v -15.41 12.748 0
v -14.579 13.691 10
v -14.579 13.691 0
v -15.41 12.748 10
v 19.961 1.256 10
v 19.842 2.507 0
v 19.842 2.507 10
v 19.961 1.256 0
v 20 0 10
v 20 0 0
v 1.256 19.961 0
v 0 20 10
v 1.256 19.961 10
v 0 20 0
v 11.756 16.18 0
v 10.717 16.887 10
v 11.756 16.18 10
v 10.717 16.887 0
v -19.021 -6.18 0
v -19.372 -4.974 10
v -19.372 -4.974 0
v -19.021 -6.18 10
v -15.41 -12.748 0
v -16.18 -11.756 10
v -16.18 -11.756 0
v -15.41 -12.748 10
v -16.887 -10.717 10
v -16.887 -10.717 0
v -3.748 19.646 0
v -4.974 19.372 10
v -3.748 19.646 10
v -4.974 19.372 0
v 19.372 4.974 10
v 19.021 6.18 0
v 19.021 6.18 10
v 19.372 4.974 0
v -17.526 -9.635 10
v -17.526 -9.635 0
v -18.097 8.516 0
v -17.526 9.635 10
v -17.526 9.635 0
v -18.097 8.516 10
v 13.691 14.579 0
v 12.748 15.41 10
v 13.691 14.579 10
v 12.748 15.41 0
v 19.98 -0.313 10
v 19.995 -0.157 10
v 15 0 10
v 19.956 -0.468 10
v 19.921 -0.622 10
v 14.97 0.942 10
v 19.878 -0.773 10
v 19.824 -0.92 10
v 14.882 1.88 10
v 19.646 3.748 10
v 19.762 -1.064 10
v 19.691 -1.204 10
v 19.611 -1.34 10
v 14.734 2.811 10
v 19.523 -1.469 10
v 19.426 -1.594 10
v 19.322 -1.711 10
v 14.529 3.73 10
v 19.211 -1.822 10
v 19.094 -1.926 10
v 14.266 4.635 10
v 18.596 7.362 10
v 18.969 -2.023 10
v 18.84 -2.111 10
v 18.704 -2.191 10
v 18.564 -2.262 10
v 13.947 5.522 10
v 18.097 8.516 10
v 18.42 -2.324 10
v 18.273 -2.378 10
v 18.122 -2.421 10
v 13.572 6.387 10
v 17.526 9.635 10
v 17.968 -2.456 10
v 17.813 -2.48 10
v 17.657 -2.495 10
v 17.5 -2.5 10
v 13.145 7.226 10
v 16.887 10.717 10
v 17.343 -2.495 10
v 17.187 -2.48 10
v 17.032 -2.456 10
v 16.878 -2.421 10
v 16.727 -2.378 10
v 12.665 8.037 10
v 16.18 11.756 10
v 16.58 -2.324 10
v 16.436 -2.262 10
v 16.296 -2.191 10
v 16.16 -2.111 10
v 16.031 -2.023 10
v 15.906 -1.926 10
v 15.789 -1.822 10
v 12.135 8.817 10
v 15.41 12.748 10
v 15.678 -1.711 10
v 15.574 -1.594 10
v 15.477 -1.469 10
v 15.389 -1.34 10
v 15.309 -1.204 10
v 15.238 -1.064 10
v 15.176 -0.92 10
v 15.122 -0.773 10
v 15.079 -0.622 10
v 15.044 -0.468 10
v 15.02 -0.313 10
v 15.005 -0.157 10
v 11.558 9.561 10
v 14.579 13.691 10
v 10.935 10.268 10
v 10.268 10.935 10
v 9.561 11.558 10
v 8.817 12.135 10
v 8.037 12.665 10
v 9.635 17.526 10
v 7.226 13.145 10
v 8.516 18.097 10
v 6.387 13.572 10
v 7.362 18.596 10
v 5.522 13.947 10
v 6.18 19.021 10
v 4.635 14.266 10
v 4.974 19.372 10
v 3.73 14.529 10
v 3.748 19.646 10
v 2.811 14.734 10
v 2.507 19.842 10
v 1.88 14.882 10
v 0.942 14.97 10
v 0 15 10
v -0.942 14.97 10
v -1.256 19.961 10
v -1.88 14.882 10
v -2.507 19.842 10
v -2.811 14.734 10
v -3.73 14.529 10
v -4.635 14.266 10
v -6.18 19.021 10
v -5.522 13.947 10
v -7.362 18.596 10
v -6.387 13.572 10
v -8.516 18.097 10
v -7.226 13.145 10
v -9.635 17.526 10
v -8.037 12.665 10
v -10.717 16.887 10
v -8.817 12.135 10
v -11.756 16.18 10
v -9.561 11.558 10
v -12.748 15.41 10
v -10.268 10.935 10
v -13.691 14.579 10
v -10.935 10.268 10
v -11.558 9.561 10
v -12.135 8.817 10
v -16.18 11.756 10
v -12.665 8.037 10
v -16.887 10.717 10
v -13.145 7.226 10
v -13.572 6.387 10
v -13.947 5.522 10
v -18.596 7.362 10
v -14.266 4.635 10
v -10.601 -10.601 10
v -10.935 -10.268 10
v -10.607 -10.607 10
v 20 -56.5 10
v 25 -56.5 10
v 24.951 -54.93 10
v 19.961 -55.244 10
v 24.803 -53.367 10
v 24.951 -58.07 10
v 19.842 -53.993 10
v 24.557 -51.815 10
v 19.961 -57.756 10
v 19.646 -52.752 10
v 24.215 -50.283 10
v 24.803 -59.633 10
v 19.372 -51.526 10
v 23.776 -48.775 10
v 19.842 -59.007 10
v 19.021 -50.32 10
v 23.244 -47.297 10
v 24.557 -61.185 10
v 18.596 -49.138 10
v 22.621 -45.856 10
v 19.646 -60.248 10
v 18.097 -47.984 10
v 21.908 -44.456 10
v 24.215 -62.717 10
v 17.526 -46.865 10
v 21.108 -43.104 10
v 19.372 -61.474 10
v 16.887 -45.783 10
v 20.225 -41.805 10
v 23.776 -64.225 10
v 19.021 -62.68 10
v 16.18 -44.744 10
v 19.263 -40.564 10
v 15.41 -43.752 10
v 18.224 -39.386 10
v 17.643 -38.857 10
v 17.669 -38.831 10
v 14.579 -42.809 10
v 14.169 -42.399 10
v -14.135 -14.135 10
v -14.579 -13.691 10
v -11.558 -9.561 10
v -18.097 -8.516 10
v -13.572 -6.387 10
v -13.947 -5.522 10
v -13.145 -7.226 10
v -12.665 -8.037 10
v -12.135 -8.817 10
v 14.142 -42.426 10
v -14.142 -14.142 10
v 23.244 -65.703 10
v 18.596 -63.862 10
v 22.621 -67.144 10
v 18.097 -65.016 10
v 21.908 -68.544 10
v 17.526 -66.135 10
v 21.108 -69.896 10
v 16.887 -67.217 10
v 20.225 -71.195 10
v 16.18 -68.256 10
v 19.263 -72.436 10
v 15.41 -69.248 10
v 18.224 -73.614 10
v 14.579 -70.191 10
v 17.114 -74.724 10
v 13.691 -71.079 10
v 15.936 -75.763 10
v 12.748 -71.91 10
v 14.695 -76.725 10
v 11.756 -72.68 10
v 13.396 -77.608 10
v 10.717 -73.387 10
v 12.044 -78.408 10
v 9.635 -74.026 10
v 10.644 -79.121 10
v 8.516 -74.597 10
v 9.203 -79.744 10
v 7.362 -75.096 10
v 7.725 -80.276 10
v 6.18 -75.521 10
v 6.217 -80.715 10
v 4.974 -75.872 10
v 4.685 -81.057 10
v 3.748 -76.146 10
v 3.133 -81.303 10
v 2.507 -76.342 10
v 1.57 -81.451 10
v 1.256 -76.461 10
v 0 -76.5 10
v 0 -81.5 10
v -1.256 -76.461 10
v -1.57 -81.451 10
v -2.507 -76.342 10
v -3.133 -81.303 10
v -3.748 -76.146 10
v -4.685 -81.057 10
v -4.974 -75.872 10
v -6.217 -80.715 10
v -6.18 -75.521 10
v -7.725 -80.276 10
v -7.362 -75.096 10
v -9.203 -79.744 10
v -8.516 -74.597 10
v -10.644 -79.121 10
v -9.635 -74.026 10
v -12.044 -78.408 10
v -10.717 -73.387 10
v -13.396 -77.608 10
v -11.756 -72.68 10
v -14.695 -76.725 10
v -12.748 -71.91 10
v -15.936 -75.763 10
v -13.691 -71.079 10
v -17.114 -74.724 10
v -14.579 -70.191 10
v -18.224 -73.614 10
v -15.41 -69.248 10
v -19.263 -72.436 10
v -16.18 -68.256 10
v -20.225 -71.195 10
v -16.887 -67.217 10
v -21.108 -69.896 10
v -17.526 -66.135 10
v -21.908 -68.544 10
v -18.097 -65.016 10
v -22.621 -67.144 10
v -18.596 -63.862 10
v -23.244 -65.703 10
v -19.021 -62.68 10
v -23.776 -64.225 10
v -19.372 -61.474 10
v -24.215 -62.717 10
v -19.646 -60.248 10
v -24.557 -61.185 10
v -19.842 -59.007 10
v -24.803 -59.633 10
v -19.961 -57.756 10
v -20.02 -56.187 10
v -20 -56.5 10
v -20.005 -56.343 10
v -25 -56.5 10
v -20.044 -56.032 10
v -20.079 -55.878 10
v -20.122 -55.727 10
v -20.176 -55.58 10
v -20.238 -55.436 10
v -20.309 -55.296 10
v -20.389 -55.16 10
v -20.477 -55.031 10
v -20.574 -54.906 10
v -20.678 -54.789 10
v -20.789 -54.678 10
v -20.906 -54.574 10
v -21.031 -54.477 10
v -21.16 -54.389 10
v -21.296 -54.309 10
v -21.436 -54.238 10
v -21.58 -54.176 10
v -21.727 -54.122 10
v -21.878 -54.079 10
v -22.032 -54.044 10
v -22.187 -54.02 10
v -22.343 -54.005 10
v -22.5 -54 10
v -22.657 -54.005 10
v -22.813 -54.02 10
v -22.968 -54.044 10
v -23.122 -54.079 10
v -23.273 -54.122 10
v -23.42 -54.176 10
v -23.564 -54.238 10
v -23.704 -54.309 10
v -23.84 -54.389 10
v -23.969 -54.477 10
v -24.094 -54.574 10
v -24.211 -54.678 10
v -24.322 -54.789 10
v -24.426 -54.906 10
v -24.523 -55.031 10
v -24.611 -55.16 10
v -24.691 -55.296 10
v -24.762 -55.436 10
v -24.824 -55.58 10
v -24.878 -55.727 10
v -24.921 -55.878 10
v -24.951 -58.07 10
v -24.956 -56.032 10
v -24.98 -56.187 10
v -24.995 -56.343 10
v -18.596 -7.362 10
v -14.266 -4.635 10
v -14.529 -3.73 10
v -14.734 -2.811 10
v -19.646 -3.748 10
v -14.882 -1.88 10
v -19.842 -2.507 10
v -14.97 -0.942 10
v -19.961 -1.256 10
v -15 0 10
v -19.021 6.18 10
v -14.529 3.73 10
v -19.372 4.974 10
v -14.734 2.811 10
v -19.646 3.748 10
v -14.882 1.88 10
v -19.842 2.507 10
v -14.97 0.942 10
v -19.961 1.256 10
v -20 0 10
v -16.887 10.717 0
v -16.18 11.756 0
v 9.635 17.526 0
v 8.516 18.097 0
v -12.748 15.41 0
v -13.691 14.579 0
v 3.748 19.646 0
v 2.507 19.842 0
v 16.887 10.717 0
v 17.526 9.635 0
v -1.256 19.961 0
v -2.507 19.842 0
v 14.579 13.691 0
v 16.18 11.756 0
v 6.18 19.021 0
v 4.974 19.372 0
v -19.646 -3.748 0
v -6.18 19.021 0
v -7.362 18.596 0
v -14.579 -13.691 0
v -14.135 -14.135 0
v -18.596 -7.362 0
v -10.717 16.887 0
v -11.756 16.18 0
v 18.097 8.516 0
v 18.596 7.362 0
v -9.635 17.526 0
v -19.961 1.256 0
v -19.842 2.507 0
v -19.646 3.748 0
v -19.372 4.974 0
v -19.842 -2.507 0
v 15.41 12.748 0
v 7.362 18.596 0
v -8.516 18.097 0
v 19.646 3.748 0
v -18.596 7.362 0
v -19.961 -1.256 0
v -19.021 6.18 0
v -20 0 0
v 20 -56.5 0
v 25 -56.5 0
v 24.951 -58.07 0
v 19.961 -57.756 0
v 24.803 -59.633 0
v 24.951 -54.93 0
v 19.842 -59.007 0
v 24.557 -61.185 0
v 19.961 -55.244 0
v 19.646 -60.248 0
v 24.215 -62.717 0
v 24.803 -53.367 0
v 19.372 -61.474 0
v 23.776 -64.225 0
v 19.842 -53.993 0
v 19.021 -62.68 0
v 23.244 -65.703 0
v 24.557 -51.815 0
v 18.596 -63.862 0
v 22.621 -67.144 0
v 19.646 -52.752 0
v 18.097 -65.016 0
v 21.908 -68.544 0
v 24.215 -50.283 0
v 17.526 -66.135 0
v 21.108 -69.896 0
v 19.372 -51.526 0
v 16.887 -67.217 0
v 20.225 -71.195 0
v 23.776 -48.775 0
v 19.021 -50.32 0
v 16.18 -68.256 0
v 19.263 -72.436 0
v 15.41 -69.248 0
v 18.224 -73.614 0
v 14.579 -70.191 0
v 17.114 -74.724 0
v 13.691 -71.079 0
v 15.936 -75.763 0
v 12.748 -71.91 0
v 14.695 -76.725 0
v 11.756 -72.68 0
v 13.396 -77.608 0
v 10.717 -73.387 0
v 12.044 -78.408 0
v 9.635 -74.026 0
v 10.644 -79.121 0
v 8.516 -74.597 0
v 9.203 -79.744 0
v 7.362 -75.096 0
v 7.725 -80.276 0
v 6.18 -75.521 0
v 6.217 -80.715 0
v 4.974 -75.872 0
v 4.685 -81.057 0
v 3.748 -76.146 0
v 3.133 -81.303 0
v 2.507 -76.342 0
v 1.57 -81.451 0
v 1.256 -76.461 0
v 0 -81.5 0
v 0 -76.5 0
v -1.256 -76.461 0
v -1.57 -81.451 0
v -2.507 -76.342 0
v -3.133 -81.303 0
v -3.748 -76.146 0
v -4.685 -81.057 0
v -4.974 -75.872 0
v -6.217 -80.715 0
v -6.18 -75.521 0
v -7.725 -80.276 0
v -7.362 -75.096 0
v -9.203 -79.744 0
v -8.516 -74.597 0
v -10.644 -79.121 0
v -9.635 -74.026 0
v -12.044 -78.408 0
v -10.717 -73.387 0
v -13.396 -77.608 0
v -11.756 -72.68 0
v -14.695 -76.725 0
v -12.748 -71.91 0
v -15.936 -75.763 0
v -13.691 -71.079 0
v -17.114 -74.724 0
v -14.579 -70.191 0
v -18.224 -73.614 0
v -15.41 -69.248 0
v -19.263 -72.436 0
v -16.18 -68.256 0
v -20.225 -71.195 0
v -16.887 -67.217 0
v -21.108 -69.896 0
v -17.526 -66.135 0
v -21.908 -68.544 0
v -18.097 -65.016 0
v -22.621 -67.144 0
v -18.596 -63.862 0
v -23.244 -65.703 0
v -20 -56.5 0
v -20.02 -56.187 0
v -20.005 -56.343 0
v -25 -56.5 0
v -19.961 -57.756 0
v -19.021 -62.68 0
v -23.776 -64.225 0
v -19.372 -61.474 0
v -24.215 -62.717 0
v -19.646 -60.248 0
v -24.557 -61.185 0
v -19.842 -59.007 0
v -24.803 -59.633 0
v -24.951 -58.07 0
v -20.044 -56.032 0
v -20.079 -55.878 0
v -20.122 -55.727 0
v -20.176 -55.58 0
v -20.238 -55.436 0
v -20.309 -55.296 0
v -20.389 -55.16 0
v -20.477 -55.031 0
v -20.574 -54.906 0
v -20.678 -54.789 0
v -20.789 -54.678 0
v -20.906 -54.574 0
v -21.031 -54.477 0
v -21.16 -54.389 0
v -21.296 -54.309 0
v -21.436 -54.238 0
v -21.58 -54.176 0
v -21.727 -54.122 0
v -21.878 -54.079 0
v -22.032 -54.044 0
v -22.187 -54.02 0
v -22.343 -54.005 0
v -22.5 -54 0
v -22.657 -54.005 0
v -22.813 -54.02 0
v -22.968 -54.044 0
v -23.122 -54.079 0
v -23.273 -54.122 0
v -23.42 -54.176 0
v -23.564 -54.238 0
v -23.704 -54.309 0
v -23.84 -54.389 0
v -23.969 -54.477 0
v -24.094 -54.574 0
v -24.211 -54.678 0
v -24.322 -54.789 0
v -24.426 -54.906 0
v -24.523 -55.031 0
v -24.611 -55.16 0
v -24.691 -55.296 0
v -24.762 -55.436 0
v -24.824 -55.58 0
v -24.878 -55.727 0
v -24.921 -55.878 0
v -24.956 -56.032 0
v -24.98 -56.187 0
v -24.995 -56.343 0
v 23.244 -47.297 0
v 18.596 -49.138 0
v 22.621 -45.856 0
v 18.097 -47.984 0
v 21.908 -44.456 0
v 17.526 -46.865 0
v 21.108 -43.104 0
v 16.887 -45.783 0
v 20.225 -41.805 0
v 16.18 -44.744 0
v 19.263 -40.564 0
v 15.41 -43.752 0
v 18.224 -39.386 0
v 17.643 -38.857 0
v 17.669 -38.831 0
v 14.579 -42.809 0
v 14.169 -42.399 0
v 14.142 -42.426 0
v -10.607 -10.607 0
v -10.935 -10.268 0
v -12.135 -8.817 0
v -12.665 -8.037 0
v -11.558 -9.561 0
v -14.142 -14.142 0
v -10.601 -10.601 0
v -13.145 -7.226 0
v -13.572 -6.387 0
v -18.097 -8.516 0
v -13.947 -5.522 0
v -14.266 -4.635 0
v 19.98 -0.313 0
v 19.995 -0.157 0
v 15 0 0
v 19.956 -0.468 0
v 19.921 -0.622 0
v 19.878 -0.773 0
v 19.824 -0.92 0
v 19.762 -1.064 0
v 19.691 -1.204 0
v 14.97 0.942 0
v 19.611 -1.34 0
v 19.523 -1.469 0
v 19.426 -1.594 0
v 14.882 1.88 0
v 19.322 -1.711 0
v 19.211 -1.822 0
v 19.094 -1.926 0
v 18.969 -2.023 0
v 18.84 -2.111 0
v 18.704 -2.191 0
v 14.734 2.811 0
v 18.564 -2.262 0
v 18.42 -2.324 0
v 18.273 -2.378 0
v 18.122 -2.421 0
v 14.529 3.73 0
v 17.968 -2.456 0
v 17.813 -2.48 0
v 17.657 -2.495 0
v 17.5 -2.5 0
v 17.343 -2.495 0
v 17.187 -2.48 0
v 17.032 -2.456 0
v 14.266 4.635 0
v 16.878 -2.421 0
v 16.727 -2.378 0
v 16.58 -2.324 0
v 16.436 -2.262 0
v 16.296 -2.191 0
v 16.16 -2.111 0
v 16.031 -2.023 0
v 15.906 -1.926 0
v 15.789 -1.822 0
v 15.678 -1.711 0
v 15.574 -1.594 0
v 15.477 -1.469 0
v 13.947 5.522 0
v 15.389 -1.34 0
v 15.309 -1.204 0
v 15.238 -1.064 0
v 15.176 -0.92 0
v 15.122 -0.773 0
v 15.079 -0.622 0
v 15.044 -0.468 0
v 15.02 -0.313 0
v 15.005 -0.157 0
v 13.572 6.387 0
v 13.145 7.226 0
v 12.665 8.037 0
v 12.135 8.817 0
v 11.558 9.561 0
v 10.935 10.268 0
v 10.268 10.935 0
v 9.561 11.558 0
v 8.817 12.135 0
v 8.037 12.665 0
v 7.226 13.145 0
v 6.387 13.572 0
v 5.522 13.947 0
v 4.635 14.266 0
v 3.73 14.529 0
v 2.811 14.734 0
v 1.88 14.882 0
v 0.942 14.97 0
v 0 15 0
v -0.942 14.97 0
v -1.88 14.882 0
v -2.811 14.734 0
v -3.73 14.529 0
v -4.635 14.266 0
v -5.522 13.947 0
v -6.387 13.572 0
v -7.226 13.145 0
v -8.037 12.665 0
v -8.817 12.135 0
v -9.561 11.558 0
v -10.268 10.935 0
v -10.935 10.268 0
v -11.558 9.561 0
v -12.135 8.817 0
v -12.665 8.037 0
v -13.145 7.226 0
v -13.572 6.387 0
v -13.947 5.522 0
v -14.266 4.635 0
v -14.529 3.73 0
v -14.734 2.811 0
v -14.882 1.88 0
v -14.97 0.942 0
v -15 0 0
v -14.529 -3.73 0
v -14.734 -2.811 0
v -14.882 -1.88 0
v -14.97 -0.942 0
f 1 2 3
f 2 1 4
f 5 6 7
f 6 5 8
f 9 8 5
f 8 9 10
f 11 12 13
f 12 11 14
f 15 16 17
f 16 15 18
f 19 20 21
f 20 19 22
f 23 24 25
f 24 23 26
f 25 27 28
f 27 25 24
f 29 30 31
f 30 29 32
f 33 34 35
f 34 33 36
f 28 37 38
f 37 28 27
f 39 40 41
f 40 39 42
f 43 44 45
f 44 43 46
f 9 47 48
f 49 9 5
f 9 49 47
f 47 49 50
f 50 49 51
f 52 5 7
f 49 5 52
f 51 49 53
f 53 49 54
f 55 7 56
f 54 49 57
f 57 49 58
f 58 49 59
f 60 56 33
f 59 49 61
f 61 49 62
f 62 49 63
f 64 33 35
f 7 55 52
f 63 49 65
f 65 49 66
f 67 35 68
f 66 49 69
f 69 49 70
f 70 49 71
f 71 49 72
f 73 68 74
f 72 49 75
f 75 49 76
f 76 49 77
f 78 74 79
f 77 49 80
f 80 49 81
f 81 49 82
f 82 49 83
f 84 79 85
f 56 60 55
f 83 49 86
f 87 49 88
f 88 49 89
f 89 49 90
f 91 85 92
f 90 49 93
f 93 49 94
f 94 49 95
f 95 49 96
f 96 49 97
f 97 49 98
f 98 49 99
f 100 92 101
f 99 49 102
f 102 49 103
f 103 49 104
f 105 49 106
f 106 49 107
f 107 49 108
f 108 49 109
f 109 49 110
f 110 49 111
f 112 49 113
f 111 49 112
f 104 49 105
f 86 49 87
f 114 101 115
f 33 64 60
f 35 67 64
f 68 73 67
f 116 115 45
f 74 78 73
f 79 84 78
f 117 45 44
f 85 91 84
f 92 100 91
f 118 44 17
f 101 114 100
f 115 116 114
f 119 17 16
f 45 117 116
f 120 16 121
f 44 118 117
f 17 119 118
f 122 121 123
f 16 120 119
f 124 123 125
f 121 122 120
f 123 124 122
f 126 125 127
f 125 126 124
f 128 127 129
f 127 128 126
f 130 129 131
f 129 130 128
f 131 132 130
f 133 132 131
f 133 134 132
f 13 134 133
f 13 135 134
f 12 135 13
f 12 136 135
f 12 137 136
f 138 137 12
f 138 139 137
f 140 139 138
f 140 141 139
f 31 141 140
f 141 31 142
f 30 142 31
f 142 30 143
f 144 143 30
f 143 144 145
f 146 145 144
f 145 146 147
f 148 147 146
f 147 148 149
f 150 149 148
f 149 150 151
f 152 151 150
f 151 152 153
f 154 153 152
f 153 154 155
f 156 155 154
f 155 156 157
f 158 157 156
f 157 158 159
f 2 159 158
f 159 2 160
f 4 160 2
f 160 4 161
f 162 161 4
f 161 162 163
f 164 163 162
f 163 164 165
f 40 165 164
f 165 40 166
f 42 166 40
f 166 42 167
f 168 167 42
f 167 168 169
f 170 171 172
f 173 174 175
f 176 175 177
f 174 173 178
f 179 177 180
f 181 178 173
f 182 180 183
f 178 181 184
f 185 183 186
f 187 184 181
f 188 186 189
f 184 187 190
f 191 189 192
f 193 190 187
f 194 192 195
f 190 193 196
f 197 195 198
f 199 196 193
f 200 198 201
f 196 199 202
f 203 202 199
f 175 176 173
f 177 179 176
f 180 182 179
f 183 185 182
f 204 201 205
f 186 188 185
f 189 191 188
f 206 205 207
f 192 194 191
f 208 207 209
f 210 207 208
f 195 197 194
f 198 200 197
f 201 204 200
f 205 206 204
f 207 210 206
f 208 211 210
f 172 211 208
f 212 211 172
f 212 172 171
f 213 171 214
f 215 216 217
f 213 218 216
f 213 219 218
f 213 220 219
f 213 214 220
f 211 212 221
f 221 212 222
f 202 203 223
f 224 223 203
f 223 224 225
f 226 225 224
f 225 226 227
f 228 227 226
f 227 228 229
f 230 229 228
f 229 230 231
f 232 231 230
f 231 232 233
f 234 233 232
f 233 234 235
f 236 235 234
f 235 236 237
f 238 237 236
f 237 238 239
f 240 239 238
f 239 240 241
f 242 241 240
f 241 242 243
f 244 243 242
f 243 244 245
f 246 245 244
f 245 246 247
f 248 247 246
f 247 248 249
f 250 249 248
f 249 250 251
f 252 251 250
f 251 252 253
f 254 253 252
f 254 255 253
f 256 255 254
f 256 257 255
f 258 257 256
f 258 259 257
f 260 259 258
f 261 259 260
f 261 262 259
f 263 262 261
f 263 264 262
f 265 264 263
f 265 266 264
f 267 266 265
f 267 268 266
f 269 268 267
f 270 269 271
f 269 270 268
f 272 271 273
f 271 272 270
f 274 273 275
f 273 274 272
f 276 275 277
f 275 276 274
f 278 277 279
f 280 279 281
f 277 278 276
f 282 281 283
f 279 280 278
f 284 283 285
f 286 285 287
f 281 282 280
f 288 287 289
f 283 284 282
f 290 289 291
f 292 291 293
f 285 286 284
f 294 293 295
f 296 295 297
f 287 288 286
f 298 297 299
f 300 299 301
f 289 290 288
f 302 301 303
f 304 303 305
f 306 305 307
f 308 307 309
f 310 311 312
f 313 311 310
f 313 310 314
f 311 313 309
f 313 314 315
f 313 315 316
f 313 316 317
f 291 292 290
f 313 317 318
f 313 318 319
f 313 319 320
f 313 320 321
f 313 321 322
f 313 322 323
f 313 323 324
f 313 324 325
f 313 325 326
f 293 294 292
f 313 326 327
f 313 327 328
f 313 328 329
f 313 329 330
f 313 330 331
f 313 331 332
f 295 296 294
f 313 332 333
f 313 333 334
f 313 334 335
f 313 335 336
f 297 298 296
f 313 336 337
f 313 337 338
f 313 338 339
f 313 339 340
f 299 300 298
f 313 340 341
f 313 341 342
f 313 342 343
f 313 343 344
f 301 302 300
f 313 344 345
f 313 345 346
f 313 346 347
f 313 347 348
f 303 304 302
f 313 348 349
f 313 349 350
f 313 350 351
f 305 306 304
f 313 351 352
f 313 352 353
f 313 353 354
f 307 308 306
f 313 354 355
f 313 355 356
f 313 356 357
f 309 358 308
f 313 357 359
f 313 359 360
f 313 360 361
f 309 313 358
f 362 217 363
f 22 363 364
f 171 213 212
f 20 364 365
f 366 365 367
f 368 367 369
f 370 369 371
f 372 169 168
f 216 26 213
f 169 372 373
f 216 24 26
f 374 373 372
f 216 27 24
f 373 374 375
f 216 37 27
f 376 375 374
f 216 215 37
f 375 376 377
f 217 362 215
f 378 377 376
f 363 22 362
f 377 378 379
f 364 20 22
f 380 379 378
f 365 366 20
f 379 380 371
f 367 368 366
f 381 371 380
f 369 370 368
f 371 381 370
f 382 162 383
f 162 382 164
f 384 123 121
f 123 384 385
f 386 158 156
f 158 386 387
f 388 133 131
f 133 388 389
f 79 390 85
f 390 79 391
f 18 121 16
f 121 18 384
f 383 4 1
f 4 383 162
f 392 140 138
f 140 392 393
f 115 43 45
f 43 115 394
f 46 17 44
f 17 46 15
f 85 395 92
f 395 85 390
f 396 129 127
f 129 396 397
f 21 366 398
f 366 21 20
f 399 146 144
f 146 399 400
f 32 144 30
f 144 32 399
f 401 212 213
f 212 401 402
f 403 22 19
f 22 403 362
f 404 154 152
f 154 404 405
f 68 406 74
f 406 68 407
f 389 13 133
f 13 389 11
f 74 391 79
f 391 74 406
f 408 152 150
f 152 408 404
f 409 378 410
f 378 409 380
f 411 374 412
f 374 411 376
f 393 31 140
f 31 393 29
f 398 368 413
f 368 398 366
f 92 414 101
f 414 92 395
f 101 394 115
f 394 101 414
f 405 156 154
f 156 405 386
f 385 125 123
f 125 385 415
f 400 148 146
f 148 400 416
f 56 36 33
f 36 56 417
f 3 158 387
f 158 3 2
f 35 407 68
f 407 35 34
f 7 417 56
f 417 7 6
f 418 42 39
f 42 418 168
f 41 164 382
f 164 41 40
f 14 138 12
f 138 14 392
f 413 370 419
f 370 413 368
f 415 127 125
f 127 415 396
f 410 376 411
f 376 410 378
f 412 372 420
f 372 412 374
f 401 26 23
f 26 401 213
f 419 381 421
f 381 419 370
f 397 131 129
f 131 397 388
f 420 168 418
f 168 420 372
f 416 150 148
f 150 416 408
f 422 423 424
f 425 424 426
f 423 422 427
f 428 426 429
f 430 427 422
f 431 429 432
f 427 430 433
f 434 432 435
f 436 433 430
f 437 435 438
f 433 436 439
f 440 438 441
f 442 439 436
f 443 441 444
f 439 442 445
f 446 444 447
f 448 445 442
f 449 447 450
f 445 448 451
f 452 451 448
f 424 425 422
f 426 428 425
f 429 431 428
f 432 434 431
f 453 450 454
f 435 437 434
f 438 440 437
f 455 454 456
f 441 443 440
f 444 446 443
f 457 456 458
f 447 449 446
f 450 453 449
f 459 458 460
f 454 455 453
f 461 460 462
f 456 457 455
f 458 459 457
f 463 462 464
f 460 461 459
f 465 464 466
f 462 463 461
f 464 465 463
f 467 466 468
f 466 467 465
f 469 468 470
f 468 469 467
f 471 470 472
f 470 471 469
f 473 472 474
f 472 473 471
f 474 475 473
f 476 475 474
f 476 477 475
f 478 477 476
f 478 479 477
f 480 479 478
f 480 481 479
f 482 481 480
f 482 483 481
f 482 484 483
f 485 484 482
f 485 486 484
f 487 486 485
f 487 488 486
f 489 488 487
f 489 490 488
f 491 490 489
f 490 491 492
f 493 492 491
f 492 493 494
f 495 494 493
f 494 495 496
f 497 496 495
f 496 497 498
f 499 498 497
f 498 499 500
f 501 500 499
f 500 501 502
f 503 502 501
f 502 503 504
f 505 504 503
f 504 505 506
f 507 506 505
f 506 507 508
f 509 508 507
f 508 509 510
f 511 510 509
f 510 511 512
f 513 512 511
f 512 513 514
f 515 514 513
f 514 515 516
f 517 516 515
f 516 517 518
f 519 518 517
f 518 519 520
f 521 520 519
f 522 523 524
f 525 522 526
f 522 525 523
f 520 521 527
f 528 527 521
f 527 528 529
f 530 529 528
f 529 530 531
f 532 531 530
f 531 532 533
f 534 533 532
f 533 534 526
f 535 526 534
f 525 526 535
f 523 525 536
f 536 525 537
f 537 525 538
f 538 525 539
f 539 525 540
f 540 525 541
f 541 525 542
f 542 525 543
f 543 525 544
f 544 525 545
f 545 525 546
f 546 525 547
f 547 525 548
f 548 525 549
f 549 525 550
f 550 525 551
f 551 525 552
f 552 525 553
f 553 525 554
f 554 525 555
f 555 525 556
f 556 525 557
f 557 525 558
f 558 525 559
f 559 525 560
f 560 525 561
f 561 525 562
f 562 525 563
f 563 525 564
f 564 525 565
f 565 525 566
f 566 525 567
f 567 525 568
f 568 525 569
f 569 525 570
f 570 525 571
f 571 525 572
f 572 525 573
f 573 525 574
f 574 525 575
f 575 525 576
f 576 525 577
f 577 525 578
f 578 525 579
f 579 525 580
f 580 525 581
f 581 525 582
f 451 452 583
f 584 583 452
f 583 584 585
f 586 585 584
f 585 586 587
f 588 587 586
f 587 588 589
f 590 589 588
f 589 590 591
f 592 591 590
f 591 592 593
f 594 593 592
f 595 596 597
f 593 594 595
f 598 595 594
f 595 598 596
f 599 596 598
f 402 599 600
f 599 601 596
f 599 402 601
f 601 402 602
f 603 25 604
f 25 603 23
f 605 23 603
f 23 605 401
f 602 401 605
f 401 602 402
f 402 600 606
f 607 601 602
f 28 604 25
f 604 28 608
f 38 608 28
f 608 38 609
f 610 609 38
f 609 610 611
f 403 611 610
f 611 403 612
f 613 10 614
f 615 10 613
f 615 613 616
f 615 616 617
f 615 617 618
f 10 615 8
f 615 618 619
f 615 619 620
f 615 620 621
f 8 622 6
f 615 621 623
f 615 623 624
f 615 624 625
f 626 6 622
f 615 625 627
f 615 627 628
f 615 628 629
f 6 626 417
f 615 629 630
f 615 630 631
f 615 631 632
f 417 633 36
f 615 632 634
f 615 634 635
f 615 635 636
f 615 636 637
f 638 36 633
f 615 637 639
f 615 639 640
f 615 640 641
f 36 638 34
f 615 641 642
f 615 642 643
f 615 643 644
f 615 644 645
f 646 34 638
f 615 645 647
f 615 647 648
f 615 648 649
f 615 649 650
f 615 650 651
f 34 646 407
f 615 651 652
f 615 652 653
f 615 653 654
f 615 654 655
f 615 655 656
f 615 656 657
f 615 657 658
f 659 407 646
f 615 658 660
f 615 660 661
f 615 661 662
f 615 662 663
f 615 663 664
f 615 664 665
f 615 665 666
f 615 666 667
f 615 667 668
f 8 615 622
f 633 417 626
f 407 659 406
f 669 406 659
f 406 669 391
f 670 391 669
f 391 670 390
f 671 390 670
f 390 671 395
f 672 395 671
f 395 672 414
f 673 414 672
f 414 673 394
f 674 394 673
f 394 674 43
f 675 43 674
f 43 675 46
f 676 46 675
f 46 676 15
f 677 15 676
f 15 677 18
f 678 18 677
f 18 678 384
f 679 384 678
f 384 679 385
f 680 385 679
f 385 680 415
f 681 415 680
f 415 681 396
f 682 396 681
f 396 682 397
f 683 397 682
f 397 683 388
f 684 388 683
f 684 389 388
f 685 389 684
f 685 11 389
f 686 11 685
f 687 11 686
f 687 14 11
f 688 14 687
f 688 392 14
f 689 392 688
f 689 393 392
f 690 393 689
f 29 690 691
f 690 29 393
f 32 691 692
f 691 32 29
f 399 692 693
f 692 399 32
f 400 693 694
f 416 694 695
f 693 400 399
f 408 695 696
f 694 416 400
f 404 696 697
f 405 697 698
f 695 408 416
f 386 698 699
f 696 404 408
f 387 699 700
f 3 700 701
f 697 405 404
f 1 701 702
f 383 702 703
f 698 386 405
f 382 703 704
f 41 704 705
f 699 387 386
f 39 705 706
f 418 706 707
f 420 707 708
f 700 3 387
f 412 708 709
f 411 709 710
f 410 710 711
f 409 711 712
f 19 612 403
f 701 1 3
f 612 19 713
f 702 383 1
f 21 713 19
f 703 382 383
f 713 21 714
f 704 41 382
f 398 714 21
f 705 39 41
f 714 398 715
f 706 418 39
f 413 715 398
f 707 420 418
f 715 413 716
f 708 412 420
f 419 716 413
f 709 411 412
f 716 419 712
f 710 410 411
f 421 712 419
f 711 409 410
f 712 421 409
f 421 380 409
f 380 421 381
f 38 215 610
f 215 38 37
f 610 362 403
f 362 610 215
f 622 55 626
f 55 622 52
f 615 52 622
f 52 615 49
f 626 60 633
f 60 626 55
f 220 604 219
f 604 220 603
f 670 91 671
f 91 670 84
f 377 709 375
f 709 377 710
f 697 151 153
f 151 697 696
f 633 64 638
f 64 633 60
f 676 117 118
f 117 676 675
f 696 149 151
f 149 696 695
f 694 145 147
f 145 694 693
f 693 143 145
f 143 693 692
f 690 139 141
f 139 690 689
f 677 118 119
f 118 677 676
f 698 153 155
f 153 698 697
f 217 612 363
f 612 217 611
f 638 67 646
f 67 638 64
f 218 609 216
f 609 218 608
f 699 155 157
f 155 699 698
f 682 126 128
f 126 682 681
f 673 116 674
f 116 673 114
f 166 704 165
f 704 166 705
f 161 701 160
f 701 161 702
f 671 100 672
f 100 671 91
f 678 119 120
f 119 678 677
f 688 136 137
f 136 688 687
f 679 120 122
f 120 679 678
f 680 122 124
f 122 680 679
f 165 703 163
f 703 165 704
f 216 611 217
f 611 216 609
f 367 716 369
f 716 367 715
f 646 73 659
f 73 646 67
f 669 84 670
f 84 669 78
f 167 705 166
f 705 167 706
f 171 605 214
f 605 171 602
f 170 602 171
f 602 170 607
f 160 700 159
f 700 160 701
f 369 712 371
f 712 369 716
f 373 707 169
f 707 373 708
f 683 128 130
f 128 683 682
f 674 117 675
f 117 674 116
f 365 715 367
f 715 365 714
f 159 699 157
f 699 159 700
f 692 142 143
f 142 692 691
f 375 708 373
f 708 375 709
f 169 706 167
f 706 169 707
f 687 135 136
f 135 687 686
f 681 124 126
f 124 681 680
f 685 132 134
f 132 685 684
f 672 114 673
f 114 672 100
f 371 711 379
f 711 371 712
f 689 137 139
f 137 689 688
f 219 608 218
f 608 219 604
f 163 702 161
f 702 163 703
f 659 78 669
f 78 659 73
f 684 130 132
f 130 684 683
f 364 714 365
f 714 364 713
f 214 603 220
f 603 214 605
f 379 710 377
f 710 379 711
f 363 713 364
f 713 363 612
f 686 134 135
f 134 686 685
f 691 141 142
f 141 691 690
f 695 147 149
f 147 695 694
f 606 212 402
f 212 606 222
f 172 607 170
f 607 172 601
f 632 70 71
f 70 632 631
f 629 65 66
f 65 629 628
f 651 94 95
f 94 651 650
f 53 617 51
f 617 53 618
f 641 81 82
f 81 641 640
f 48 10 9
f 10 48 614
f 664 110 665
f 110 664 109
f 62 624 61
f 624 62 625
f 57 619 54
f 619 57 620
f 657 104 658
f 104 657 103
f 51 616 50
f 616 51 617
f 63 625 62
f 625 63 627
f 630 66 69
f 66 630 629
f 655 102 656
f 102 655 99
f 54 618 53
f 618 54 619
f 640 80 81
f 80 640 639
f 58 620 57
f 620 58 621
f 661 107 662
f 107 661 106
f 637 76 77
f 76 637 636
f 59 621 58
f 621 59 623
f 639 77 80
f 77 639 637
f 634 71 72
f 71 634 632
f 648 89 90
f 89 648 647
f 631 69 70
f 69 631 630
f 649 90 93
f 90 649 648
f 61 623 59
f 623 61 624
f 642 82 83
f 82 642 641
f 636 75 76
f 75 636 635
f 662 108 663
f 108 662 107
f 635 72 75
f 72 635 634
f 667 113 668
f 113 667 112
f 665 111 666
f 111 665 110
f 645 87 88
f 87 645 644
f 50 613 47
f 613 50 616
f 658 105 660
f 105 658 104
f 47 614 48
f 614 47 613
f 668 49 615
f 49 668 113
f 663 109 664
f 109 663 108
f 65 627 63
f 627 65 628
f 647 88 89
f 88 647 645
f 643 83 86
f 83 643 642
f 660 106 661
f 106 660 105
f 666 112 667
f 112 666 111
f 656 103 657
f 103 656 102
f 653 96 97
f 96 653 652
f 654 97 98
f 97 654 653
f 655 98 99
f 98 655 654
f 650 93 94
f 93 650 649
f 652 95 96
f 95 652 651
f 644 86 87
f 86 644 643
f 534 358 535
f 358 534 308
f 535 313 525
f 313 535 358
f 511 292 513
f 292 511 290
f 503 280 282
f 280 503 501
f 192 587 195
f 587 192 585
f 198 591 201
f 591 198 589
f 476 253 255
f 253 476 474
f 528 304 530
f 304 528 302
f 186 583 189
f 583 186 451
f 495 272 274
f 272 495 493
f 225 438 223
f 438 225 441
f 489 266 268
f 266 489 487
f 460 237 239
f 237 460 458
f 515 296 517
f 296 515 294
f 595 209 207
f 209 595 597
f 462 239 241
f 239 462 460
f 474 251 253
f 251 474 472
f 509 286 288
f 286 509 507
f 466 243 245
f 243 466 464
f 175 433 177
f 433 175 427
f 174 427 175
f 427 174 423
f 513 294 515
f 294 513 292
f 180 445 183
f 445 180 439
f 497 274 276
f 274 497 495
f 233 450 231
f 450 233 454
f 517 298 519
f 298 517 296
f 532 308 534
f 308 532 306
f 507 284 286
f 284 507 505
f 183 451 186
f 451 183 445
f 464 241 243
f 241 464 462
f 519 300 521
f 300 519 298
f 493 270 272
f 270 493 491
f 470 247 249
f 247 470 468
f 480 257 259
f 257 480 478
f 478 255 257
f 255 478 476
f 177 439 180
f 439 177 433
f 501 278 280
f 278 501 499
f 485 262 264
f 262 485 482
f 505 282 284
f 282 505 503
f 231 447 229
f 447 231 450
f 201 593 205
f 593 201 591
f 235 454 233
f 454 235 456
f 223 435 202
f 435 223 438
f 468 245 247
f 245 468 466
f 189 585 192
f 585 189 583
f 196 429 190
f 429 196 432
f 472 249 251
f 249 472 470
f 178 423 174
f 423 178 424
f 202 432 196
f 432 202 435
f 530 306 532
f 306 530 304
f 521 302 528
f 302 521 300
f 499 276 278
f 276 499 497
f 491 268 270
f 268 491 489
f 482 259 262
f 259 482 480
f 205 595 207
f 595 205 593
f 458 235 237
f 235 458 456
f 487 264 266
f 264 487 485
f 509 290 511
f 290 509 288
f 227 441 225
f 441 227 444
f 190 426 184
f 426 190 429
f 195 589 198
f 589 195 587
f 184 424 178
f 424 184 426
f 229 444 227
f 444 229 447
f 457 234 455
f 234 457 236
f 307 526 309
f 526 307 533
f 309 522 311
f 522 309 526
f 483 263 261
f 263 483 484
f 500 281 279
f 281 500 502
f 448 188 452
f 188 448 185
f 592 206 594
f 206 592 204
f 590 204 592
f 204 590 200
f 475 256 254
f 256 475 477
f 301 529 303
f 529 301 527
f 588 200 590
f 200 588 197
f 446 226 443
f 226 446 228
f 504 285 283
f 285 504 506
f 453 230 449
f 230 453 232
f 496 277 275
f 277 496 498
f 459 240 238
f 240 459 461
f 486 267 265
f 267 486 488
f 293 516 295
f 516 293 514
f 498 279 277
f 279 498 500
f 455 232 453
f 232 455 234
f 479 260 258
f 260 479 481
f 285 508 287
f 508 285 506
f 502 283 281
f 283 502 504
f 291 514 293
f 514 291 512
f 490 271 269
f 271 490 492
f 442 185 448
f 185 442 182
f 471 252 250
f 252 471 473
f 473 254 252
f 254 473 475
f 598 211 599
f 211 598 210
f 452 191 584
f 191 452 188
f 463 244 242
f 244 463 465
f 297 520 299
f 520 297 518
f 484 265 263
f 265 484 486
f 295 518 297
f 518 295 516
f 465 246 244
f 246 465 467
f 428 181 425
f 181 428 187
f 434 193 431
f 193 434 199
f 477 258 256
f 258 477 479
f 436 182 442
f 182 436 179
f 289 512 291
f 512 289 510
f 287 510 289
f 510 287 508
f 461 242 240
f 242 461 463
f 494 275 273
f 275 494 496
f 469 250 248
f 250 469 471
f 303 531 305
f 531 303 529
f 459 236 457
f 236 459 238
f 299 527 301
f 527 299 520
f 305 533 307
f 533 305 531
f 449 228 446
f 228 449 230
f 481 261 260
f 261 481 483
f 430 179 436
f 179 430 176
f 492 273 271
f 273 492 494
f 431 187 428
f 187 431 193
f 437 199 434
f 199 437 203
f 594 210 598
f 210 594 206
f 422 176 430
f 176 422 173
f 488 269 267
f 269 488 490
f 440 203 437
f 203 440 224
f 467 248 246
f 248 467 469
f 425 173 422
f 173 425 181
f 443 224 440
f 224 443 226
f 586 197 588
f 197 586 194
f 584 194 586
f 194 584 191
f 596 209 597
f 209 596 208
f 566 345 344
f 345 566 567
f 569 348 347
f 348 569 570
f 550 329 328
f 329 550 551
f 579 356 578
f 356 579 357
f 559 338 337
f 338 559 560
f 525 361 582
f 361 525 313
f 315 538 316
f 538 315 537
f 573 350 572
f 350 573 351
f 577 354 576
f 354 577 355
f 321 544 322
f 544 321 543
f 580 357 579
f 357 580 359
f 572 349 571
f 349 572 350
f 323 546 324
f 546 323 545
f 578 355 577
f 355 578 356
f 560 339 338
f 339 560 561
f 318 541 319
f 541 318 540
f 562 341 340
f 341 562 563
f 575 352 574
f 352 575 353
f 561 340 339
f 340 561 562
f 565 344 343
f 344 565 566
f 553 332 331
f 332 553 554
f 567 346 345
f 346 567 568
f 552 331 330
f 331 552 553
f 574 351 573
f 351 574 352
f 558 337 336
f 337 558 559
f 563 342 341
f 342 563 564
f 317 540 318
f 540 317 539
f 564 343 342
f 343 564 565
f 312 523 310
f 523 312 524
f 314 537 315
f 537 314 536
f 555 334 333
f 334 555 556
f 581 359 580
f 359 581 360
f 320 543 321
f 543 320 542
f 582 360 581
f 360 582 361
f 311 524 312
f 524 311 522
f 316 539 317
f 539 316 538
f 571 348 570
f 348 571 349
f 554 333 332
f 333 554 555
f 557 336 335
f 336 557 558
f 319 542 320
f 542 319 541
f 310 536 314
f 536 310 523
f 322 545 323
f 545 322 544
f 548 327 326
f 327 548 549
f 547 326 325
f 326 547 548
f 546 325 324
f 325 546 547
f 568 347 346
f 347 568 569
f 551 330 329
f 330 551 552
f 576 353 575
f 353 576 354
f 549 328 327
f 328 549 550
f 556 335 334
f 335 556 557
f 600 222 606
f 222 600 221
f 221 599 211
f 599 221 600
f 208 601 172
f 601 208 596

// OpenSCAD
module hook() {
    top(10, 20);
    middle();
    bottom(10, 25);
}

module top(h, r) {
    segments = 100;
    union() {
        difference() {
            cylinder(h = h, r = r, $fn=segments);
            translate(v = [0, 0, -1]) {
                cylinder(h = h+2, r = r-5, $fn=segments);
            }
            translate([0, -r, -1]) {
                cube([r*3, r, 12]);
            }
            translate([(r-5)*-1, (r-5)*-1, -1]) {
                rotate(a = -45, v = [0, 0, 1]) {
                    cube([30, r, 12]);
                }
            }
            
        }
        translate(v = [-r+2.5, 0, 0]) {
            cylinder(h = h, r = 2.5, $fn=segments);
        }
        translate(v = [r-2.5, 0, 0]) {
            cylinder(h = h, r = 2.5, $fn=segments);
        }
    }
}

module middle() {
    rotate(a = 45, v = [0, 0, 1]) {
        translate(v = [-20, -40, 0]) {
            cube([5, 40, 10]);
        }
    }
}

module bottom(h, r) {
    rotate(a = 180, v = [0, 0, 1]) 
    translate(v = [0, 56.5, 0]) 
    top(h, r);
}

hook();
